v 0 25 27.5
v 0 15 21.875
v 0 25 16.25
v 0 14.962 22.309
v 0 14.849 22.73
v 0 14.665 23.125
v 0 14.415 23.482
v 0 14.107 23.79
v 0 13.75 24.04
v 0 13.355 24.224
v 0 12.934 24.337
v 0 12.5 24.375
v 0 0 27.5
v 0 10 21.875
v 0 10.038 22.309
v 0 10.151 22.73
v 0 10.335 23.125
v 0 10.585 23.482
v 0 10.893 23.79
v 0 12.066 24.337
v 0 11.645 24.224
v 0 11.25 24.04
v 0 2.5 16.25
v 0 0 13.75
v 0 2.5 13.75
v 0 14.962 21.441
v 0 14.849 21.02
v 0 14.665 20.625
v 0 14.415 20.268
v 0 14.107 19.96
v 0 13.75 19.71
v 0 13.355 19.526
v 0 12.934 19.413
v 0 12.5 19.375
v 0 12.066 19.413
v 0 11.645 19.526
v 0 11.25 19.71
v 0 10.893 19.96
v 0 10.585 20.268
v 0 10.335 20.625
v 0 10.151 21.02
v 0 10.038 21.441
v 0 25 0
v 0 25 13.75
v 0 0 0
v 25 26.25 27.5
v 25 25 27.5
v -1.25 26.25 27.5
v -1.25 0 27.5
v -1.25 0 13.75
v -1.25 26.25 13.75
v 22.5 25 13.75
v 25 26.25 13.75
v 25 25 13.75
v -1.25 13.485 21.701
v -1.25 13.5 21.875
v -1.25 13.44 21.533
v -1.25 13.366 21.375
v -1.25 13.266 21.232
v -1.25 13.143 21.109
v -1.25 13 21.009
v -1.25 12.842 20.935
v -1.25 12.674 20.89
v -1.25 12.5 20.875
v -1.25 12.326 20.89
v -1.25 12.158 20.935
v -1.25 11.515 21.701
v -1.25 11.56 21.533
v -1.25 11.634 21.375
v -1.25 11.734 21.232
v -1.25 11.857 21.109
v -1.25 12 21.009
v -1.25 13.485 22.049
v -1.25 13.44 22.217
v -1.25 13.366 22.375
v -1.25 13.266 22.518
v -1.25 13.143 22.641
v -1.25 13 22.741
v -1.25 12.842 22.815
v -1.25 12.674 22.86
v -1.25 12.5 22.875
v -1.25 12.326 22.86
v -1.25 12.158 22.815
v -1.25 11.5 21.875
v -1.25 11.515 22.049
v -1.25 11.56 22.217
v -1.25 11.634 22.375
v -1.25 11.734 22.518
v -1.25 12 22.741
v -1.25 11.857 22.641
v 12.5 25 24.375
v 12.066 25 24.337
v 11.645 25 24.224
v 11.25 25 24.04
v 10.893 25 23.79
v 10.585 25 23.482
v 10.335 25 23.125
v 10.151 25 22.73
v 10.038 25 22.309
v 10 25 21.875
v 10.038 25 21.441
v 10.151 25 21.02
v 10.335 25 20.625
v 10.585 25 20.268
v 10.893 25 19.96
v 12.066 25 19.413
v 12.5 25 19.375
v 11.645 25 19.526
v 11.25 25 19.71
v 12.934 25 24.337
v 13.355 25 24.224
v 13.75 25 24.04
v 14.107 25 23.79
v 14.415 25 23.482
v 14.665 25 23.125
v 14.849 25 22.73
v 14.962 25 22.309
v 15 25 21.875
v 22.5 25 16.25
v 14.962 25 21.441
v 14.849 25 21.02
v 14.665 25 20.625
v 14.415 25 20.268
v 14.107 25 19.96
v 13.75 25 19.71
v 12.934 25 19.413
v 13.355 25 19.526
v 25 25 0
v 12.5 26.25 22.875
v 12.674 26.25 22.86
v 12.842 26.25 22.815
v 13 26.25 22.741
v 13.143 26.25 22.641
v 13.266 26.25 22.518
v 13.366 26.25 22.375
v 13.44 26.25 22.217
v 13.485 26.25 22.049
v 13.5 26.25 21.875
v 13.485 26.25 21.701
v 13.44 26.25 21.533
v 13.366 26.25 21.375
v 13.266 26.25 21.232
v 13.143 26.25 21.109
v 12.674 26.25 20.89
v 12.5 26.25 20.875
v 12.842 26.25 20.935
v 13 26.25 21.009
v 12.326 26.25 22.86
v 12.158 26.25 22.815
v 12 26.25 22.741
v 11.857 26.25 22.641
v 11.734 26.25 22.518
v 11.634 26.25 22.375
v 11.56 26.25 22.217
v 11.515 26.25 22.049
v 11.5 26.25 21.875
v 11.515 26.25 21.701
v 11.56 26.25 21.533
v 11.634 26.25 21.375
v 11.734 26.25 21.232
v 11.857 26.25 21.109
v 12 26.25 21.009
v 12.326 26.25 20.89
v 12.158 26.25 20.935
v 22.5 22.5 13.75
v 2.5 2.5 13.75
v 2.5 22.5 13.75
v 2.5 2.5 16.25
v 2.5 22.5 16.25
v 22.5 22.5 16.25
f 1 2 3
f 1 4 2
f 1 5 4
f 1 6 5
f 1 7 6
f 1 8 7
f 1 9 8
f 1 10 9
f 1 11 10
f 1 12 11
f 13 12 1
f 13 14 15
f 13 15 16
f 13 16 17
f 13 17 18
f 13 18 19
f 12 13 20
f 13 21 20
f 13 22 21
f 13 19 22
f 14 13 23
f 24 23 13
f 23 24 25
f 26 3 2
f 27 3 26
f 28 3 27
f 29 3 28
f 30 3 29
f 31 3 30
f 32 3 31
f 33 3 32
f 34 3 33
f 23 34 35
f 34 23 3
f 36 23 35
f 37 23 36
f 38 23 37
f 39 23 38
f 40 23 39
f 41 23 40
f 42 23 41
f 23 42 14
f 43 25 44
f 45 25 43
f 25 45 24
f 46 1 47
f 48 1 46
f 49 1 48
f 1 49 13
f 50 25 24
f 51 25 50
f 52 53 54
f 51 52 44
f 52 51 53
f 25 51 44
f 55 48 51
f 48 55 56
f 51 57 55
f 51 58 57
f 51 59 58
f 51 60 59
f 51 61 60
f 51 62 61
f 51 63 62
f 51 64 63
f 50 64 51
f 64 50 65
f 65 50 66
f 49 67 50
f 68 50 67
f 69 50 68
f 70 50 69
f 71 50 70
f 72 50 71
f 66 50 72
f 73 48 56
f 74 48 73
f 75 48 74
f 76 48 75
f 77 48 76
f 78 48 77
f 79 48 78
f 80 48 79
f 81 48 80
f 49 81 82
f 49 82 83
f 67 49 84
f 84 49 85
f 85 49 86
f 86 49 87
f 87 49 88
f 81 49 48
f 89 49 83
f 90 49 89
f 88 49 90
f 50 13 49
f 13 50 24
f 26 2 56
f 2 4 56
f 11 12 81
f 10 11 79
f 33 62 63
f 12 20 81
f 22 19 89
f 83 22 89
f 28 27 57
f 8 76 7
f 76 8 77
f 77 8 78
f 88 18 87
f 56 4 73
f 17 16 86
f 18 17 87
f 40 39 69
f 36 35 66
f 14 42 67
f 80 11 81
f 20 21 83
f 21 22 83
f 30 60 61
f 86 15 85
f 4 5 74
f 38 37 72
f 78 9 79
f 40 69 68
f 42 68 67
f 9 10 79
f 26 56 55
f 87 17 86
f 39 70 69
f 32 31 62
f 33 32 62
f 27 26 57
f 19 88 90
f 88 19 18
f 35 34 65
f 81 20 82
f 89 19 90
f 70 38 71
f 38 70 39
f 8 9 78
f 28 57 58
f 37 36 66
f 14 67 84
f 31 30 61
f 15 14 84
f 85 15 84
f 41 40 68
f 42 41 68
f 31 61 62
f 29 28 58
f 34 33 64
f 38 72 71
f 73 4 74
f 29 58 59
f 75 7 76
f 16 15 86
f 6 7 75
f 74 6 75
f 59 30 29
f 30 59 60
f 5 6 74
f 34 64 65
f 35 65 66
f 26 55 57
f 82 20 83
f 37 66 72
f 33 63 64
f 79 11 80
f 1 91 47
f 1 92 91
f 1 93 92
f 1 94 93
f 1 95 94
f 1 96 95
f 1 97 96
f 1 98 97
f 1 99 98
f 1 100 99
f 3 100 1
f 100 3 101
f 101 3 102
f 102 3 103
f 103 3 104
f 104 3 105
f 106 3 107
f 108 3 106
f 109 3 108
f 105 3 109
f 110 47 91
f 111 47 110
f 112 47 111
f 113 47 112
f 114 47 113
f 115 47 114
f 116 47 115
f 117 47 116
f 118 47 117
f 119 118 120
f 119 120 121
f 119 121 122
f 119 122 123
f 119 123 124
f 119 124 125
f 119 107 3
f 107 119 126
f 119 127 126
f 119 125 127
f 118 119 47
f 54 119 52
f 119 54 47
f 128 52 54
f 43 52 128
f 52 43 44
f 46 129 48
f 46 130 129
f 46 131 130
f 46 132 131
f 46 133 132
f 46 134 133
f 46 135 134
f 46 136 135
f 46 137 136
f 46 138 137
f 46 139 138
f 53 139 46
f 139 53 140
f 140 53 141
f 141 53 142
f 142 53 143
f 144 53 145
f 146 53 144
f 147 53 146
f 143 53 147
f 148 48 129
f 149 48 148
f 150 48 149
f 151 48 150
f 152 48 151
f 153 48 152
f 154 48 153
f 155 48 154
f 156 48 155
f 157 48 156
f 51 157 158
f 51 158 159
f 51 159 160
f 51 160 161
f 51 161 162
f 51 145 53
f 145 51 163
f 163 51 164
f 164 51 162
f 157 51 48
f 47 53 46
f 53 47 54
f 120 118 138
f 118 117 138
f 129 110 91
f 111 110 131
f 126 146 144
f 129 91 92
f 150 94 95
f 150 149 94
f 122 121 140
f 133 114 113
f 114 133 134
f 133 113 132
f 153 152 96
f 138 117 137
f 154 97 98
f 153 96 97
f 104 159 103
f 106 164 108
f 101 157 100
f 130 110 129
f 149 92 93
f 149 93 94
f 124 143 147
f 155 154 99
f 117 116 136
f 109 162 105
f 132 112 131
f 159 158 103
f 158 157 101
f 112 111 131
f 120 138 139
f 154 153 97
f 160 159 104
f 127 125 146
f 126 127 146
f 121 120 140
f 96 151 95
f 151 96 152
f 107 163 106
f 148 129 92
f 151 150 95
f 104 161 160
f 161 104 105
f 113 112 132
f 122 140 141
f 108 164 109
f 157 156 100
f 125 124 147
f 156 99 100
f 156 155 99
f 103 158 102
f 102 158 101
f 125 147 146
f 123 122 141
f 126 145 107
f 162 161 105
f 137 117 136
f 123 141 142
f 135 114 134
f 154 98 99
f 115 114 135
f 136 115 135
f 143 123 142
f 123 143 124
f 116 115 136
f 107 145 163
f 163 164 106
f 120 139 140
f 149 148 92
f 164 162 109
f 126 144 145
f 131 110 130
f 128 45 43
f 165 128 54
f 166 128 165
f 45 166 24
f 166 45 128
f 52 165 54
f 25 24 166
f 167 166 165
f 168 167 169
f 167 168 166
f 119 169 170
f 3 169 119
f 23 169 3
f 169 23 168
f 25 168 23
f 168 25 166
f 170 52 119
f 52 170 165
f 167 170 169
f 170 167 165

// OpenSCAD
//Breite
x=15;
//WidthKlotz
w=x+10;
//Dicke
d=1.25; //-1.35
//Innen
b=x-d;
//Schraube oben durchmesser
sod=5;
//Schraube unten durchmesser
sud=2;
//Schraubenkopflänge
skl=d;
//Klickabstand
ka=11;
//Breite-Klickabstand
kb=b-ka;
//thickness
t=d;

$fn=36;

//Kubus komplette äußere Hoehe und mit Toleranz an beiden Seiten (w), w noch anpassen

//cube([w,w,b]);

//Daraus machen wir jetzt ein Polygon (nur den queren Dreiecksteil)

linear_extrude(b)
polygon([[0,0],[0,w],[w,w]]);

//Jetzt Wände für die Schrauben hochziehen mit Versatz (d) nach hinten
module wand1()
{
    difference() {
color("green")
translate([-d,0,b])
cube([t,w,b]);

//Jetzt Bohrung mittig setzen vor Verbinder mit Klotz

color("red")
translate([0,w/2,b+b/2+t])
rotate([270,0,90])
cylinder(d, d1=sod,d2=sud);
    }
}

wand1();

//Der Verbinder hat t+t

color("yellow")
translate([0,t+t,b]) 
cube([t+t,w-t-t,t+t]);

//Wand2

module wand2()
{
    translate([0,w,0]) 
    rotate([0,0,270])
   wand1();
}
wand2();

//Connector 2

color("orange")
translate([0,w-t-t,b]) 
cube([w-t-t,t+t,t+t]);

//Connector 2

color("blue")
translate([-d,w,b]) 
cube([d,d,b]);
